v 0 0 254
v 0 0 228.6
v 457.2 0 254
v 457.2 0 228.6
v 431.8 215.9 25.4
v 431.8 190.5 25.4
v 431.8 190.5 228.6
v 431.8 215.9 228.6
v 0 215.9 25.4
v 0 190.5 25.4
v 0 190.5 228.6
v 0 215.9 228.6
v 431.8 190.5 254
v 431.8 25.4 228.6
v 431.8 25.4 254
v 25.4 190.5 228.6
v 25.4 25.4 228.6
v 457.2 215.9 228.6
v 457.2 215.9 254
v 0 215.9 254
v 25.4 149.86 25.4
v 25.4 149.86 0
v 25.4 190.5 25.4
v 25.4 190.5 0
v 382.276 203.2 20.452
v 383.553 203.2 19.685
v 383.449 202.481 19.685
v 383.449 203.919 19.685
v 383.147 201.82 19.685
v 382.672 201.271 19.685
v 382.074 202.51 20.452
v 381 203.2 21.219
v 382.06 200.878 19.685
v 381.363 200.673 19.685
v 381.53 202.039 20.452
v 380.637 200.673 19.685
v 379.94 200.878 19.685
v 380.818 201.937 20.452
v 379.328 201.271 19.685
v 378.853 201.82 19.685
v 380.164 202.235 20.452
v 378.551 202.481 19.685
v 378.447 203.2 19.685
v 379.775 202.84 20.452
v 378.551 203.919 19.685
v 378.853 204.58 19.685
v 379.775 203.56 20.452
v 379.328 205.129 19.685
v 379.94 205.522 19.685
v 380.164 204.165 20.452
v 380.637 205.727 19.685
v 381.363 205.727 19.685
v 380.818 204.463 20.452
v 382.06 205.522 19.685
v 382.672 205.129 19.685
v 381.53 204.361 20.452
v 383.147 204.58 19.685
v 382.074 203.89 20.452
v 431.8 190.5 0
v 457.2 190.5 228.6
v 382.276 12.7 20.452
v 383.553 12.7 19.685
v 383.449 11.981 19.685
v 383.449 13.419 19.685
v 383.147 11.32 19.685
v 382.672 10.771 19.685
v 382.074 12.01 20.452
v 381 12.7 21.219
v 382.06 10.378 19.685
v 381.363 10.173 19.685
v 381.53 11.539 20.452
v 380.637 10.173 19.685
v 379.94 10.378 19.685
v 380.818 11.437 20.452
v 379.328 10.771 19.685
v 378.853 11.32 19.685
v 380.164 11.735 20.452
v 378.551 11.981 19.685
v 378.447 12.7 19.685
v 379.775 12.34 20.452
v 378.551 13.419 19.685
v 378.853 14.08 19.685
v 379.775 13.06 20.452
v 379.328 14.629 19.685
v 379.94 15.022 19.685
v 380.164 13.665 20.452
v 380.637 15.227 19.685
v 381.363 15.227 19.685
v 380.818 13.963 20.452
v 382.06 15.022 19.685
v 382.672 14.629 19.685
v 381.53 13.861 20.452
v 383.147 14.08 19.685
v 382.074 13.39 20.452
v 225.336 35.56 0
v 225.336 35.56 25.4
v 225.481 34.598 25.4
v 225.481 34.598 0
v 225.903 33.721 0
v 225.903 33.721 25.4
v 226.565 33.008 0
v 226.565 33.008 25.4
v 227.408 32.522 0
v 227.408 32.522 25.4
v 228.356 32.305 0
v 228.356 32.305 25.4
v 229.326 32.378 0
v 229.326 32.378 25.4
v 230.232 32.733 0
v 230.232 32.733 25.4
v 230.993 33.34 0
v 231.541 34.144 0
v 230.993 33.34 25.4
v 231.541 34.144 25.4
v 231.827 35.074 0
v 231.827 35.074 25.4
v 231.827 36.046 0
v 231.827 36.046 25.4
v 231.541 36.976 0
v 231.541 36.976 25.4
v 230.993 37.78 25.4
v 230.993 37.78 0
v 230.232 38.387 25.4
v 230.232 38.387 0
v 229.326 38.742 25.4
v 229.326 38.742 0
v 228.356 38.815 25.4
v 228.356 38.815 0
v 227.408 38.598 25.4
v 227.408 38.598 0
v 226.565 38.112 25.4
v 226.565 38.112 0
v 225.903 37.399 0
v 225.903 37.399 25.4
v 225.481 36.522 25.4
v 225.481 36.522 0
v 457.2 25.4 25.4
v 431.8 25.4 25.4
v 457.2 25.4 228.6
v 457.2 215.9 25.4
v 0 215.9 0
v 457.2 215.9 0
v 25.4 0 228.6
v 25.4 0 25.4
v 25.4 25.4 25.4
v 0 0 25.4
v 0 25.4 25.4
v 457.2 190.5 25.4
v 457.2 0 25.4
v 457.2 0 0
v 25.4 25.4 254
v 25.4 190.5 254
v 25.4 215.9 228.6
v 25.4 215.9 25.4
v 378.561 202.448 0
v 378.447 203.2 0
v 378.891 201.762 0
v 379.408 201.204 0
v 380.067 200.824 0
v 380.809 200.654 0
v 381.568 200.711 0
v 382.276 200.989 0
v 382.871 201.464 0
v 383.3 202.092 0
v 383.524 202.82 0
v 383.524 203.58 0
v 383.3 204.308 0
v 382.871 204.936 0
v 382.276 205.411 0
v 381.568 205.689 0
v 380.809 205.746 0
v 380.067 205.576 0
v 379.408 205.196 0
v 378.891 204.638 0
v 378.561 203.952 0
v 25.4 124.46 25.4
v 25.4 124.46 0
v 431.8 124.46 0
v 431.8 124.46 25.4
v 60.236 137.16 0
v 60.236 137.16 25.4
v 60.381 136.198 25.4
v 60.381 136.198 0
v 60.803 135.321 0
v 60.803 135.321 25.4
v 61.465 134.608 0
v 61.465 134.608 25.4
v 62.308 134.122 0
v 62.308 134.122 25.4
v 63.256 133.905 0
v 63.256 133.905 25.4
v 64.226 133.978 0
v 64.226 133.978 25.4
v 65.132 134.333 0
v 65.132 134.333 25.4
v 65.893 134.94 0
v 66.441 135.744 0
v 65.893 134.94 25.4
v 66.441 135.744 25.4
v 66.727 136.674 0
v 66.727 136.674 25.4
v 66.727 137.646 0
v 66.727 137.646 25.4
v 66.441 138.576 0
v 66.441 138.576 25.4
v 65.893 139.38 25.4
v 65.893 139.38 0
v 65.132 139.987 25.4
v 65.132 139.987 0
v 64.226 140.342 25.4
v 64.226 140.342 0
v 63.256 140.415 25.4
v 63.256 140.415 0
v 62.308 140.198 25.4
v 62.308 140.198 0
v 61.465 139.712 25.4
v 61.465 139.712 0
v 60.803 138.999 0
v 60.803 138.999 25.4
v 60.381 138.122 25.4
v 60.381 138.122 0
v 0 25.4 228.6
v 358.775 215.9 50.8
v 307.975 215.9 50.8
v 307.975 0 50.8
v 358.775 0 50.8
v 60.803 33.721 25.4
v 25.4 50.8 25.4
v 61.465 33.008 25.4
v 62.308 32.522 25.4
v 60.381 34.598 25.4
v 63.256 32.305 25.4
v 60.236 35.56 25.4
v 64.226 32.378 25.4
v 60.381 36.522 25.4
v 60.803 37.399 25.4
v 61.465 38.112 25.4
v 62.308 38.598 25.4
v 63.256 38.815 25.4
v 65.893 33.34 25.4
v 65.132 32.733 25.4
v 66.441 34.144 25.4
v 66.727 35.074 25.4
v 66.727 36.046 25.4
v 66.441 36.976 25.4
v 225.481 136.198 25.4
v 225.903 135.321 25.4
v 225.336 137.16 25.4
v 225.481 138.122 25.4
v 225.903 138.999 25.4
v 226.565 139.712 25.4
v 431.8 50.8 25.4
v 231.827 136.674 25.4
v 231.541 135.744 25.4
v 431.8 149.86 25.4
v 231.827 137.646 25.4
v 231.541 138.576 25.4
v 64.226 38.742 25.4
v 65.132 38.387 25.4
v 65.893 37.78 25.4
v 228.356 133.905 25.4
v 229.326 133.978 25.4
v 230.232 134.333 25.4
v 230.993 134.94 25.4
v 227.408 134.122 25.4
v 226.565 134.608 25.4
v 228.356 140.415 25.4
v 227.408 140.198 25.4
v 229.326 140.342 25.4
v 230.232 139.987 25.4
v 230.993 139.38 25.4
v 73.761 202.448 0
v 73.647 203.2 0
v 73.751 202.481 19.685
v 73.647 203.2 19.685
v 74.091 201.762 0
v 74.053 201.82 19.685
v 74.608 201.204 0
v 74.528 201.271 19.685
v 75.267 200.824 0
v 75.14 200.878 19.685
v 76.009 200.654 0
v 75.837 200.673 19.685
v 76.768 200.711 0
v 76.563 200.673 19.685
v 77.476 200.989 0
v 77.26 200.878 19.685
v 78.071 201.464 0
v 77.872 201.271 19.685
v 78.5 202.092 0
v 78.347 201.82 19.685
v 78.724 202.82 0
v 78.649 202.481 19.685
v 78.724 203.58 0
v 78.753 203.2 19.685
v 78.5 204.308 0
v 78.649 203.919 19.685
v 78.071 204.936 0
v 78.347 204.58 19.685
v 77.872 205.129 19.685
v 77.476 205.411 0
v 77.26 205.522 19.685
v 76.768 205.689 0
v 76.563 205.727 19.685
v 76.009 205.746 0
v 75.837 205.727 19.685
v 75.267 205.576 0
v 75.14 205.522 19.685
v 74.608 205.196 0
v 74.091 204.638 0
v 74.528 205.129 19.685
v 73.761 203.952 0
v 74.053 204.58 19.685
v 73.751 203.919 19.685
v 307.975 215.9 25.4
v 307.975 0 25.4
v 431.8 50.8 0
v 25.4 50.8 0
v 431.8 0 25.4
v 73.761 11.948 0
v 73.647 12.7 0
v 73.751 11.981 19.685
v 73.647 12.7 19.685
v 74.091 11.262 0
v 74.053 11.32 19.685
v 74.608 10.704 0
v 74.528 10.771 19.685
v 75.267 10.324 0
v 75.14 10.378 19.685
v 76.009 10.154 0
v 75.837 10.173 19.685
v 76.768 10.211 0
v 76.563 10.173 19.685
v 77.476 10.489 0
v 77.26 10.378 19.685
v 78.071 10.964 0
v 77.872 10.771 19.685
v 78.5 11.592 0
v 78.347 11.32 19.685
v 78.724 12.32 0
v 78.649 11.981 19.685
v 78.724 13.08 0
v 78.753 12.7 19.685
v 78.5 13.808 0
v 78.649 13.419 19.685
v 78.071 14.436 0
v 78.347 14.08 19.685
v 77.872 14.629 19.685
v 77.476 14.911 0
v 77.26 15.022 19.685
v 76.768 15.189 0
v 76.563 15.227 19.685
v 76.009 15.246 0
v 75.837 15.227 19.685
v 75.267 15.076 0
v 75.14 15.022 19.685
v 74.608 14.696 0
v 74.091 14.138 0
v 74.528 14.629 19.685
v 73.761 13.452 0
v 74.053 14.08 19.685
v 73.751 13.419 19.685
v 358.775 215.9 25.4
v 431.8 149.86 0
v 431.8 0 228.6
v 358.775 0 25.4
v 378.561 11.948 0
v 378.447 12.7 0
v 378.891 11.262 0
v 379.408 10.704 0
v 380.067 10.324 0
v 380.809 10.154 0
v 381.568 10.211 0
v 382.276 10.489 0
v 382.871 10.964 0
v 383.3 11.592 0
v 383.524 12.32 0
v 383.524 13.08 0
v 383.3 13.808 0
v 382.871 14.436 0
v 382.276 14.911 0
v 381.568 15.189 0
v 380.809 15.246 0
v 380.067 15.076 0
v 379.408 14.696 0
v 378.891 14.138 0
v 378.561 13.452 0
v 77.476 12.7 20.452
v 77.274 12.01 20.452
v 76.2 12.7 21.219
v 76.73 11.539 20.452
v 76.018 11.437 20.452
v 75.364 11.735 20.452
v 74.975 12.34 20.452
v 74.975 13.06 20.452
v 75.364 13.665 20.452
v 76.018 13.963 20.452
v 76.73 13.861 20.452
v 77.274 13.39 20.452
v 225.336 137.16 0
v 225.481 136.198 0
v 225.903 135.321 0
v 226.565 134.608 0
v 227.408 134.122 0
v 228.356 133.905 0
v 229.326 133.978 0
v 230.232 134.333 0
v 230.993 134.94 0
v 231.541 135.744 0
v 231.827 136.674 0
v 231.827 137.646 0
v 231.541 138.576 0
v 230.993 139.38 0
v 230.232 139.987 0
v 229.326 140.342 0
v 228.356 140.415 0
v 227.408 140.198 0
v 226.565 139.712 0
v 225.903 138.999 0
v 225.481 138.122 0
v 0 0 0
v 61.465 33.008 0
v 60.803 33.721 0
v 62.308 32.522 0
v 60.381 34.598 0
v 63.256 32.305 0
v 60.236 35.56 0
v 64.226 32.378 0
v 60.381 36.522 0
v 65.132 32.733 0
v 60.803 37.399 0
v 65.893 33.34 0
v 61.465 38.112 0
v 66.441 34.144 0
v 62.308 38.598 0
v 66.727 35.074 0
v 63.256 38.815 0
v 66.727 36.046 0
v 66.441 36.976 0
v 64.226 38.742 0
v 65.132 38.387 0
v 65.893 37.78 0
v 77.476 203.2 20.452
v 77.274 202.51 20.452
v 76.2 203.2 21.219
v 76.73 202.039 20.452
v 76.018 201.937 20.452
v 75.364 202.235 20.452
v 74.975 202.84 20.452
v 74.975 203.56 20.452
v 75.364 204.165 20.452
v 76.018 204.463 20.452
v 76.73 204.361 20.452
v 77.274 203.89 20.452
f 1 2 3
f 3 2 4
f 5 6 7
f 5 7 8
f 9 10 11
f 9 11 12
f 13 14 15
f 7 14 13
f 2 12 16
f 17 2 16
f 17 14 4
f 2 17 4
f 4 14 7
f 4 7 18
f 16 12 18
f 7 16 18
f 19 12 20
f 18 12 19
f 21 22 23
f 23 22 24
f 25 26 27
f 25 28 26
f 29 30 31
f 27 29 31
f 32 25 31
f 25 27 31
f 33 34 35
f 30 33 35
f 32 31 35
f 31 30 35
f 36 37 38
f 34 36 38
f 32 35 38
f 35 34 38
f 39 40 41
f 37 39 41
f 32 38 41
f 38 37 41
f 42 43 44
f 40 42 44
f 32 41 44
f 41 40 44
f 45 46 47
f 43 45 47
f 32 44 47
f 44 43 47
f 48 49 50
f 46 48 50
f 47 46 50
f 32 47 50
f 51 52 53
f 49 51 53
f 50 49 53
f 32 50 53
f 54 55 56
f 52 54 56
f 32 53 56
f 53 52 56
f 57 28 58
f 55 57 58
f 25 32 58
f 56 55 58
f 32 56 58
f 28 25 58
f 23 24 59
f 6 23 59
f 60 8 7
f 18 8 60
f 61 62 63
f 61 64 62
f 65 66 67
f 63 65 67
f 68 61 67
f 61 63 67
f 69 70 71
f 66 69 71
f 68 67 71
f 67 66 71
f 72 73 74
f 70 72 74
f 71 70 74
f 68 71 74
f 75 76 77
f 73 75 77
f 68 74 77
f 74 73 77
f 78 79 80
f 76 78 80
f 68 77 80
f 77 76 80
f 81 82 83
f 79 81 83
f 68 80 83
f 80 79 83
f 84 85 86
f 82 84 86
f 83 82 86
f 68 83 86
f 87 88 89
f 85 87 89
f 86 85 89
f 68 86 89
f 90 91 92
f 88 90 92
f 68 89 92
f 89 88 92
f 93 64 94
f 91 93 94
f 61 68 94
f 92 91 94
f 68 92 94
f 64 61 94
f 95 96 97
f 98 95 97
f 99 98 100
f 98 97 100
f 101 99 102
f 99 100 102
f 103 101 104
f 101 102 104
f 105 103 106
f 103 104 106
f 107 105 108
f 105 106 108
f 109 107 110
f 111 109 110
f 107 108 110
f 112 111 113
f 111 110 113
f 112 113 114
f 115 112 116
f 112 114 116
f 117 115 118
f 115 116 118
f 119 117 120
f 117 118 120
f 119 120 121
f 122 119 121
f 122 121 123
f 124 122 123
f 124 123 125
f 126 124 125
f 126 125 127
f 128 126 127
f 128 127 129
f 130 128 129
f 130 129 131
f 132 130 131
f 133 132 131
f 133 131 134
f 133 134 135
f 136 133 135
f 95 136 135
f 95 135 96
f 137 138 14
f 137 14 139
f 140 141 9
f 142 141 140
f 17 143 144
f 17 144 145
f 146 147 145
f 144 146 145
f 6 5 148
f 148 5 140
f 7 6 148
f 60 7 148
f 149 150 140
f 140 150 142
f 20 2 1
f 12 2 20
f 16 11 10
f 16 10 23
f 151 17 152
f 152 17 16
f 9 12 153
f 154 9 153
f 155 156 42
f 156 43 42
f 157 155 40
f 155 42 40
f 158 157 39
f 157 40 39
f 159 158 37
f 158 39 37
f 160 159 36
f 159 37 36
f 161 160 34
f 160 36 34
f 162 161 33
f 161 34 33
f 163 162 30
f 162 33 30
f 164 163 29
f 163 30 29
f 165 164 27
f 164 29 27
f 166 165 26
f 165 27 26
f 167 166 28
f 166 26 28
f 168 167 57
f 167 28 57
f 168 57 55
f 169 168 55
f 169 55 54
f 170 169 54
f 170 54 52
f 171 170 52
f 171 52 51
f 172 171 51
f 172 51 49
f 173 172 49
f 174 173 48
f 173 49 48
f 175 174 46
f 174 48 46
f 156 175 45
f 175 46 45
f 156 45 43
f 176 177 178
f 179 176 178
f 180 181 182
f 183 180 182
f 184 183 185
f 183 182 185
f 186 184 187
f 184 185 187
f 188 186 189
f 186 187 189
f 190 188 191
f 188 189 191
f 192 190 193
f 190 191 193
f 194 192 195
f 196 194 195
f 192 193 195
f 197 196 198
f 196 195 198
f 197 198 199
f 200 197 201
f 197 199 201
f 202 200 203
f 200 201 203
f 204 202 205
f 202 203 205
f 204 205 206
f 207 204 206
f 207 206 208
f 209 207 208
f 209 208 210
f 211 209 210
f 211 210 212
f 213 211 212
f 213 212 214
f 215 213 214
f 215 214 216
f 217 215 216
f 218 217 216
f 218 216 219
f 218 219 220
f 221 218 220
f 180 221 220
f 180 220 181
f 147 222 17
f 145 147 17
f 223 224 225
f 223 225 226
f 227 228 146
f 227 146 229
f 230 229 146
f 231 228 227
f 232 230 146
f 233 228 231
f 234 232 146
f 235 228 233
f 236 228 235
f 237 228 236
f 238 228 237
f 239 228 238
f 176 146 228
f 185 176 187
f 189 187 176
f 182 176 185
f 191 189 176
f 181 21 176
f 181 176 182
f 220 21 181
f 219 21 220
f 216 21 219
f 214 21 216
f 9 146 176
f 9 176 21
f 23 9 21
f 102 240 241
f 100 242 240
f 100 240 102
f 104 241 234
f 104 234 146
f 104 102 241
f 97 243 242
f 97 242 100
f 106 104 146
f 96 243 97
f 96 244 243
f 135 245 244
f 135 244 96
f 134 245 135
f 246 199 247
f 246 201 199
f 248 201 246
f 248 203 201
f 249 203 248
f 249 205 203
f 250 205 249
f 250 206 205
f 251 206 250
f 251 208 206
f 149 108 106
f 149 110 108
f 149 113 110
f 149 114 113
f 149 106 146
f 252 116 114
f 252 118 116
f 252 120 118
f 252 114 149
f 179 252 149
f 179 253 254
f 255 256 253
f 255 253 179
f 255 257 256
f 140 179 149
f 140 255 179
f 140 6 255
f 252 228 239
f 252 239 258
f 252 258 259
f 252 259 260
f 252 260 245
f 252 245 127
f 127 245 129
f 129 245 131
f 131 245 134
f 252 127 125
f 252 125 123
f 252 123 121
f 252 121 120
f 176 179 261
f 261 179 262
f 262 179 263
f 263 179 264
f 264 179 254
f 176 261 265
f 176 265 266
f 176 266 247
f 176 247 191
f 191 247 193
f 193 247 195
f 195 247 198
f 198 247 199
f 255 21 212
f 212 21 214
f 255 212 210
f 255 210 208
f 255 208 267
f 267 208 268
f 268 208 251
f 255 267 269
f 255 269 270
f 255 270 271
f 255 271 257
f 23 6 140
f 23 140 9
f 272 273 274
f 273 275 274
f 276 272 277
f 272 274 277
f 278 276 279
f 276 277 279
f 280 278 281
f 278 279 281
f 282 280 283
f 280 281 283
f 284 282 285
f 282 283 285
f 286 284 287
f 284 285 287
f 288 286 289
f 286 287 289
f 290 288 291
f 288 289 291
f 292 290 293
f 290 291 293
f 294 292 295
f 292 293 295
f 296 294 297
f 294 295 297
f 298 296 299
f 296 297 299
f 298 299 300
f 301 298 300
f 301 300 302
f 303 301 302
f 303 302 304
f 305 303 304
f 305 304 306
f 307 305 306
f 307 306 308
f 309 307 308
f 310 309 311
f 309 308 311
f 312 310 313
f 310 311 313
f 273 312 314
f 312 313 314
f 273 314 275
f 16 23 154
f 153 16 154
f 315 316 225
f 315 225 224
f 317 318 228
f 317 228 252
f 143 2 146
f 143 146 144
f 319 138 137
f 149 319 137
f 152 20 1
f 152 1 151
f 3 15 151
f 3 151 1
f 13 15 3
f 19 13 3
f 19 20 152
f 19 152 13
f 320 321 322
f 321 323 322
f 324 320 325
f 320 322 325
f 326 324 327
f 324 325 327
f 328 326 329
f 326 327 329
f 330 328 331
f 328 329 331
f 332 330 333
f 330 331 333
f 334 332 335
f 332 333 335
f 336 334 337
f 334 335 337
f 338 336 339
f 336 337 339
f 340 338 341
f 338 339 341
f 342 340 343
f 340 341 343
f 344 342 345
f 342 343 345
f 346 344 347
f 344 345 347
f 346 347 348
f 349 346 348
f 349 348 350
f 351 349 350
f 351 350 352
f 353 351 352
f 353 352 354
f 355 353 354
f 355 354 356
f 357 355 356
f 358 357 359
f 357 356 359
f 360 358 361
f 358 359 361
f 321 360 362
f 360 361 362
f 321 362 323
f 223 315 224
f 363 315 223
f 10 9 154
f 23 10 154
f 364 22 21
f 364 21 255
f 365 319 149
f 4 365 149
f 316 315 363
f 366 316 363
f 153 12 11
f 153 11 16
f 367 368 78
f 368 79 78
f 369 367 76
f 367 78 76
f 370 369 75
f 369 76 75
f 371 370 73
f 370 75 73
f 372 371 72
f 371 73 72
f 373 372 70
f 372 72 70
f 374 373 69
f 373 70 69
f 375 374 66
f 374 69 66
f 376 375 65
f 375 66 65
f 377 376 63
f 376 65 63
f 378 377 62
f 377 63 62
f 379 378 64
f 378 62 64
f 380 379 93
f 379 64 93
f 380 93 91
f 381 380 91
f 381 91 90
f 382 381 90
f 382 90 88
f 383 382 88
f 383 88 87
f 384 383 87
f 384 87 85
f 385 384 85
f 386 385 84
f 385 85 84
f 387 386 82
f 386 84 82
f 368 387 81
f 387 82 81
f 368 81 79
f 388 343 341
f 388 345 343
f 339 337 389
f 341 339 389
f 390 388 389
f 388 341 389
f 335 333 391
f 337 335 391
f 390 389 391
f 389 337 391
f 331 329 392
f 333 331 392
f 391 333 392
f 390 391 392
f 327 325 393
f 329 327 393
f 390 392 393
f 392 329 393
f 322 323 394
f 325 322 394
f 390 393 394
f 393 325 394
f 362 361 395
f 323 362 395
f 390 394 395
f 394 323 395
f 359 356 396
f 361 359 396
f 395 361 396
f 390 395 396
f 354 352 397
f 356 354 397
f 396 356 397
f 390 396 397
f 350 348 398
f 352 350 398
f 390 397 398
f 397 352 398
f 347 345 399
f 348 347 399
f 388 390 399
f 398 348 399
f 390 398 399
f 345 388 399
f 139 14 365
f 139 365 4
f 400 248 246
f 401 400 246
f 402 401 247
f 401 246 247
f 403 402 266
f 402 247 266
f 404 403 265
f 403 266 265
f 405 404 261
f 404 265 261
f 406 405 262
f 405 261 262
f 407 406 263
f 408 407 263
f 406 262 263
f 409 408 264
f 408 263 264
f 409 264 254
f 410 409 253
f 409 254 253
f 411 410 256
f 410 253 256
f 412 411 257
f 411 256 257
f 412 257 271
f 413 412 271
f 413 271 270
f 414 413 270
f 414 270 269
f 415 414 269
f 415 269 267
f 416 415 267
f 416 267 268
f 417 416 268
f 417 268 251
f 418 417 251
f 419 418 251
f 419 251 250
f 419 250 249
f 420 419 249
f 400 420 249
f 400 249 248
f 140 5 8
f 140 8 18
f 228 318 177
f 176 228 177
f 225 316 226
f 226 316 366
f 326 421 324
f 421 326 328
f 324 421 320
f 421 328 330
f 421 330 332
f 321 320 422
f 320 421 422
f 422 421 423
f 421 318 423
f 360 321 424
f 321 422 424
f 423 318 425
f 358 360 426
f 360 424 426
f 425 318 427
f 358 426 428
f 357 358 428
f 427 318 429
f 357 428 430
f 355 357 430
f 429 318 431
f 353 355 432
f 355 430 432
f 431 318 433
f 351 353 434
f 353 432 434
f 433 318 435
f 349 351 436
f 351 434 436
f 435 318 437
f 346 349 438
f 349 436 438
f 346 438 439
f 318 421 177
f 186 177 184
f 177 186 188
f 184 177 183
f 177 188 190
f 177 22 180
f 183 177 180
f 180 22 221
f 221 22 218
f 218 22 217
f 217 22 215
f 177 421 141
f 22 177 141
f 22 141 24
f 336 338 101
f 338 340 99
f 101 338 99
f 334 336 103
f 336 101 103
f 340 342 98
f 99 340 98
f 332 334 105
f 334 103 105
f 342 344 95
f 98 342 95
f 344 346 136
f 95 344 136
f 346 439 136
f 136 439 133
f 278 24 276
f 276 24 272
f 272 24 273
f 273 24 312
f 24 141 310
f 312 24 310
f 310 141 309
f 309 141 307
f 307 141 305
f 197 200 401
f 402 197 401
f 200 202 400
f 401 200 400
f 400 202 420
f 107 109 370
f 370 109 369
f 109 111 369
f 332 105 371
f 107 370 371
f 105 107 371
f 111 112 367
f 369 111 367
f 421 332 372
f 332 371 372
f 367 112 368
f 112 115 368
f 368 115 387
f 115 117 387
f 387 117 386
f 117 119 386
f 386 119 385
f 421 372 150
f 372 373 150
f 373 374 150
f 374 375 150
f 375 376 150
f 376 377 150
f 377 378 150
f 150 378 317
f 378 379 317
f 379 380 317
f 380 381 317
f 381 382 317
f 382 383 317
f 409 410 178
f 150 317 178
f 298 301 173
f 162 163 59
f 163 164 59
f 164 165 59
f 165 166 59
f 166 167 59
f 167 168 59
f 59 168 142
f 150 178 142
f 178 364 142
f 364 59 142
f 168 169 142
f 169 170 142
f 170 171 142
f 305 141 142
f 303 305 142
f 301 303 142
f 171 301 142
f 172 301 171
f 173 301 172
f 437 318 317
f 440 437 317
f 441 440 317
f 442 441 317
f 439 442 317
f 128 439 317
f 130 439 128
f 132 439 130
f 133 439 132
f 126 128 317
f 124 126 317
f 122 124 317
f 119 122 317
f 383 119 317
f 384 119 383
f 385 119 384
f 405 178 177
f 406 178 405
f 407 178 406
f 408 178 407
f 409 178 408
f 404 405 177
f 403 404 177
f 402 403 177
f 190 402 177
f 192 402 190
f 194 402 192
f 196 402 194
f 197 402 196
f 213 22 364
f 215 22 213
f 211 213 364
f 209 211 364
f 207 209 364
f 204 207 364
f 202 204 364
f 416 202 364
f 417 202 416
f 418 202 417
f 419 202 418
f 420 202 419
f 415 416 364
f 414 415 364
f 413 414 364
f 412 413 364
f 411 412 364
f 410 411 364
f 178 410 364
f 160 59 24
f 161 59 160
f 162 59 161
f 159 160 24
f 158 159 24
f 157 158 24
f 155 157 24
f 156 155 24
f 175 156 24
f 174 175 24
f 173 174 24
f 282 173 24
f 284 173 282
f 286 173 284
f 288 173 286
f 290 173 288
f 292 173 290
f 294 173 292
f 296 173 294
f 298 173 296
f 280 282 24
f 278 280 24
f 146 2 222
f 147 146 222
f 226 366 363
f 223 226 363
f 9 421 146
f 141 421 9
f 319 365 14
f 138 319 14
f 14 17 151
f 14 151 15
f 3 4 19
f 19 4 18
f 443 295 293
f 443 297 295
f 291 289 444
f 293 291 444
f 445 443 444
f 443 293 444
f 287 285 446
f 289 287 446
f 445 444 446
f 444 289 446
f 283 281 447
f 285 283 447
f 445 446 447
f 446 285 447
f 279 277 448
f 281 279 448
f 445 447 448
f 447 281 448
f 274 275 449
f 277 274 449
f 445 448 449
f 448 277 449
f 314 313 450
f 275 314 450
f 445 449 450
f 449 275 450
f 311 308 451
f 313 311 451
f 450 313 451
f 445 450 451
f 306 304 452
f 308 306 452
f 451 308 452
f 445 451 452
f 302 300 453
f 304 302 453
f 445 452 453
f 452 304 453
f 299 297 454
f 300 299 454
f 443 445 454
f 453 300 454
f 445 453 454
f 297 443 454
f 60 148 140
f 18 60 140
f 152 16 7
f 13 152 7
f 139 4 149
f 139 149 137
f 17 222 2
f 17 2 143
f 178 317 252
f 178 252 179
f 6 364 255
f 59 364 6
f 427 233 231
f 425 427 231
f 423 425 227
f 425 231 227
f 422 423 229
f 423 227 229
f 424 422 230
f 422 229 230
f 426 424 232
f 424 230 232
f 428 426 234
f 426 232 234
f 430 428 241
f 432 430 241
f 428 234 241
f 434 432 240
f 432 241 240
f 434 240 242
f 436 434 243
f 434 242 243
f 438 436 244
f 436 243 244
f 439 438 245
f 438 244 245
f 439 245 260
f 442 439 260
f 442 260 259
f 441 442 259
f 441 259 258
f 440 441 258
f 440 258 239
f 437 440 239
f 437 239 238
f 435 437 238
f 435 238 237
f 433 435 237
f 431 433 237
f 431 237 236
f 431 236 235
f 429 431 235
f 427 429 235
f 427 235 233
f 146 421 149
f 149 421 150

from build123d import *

# Parameters (mm, degrees)
F1_W      = 457.2
F1_H      = 215.9
F1_W_2    = 406.4
F1_H_2    = 73.66
F1_H_3    = 40.64
F2_DEPTH  = 25.4
F3_D      = 6.5278
F4_D      = 6.5278
F5_W      = 50.8
F5_H      = 215.9
F6_DEPTH  = 25.4
F7_W      = 25.4
F7_H      = 25.4
F8_DEPTH  = 203.2
F9_W      = 457.2
F9_H      = 215.9
F9_W_2    = 406.4
F9_H_2    = 165.1
F10_DEPTH = 25.4
F12_D     = 5.1054
F12_DEPTH = 19.685
F12_TIP   = 1.5338169022


with BuildPart() as f2:
    # F1 (on Top) → F2 (new body)
    with BuildSketch(Plane.XY):
        with Locations((228.6, 107.95)):
            Rectangle(F1_W, F1_H)
        with Locations((228.6, 87.63)):
            Rectangle(F1_W_2, F1_H_2, mode=Mode.SUBTRACT)
        with Locations((228.6, 170.18)):
            Rectangle(F1_W_2, F1_H_3, mode=Mode.SUBTRACT)
    extrude(amount=F2_DEPTH)

    # F3 (through all)
    with Locations(Plane(origin=(0, 0, 0), x_dir=(1, 0, 0), z_dir=(0, 0, -1))):
        with Locations((63.5, -35.56), (228.6, -35.56)):
            Hole(F3_D / 2)

    # F4 (through all)
    with Locations(Plane(origin=(0, 0, 0), x_dir=(1, 0, 0), z_dir=(0, 0, -1))):
        with Locations((63.5, -137.16), (228.6, -137.16)):
            Hole(F4_D / 2)

    # F12
    with Locations(Plane(origin=(0, 0, 0), x_dir=(1, 0, 0), z_dir=(0, 0, -1))):
        with Locations((381, -203.2), (76.2, -203.2), (76.2, -12.7), (381, -12.7)):
            Hole(F12_D / 2, depth=F12_DEPTH)
            with Locations((0, 0, -(F12_DEPTH + F12_TIP / 2))):  # 118° drill point
                Cone(0, F12_D / 2, F12_TIP, mode=Mode.SUBTRACT)


with BuildPart() as f6:
    # F5 (on face) → F6 (new body)
    with BuildSketch(Plane.XY.offset(25.4)):
        with Locations((333.375, 107.95)):
            Rectangle(F5_W, F5_H)
    extrude(amount=F6_DEPTH)


with BuildPart() as f8:
    # F7 (on face) → F8 (new body)
    with BuildSketch(Plane.XY.offset(25.4)):
        with Locations((12.7, 203.2)):
            Rectangle(F7_W, F7_H)
    extrude(amount=F8_DEPTH)


with BuildPart() as f8b:
    # F7 (on face) → F8, piece 2 (new body)
    with BuildSketch(Plane.XY.offset(25.4)):
        with Locations((444.5, 203.2)):
            Rectangle(F7_W, F7_H)
    extrude(amount=F8_DEPTH)


with BuildPart() as f8c:
    # F7 (on face) → F8, piece 3 (new body)
    with BuildSketch(Plane.XY.offset(25.4)):
        with Locations((444.5, 12.7)):
            Rectangle(F7_W, F7_H)
    extrude(amount=F8_DEPTH)


with BuildPart() as f8d:
    # F7 (on face) → F8, piece 4 (new body)
    with BuildSketch(Plane.XY.offset(25.4)):
        with Locations((12.7, 12.7)):
            Rectangle(F7_W, F7_H)
    extrude(amount=F8_DEPTH)


with BuildPart() as f10:
    # F9 (on face) → F10 (new body)
    with BuildSketch(Plane.XY.offset(228.6)):
        with Locations((228.6, 107.95)):
            Rectangle(F9_W, F9_H)
        with Locations((228.6, 107.95)):
            Rectangle(F9_W_2, F9_H_2, mode=Mode.SUBTRACT)
    extrude(amount=F10_DEPTH)


solid = Compound([f2.part, f6.part, f8.part, f8b.part, f8c.part, f8d.part, f10.part])
